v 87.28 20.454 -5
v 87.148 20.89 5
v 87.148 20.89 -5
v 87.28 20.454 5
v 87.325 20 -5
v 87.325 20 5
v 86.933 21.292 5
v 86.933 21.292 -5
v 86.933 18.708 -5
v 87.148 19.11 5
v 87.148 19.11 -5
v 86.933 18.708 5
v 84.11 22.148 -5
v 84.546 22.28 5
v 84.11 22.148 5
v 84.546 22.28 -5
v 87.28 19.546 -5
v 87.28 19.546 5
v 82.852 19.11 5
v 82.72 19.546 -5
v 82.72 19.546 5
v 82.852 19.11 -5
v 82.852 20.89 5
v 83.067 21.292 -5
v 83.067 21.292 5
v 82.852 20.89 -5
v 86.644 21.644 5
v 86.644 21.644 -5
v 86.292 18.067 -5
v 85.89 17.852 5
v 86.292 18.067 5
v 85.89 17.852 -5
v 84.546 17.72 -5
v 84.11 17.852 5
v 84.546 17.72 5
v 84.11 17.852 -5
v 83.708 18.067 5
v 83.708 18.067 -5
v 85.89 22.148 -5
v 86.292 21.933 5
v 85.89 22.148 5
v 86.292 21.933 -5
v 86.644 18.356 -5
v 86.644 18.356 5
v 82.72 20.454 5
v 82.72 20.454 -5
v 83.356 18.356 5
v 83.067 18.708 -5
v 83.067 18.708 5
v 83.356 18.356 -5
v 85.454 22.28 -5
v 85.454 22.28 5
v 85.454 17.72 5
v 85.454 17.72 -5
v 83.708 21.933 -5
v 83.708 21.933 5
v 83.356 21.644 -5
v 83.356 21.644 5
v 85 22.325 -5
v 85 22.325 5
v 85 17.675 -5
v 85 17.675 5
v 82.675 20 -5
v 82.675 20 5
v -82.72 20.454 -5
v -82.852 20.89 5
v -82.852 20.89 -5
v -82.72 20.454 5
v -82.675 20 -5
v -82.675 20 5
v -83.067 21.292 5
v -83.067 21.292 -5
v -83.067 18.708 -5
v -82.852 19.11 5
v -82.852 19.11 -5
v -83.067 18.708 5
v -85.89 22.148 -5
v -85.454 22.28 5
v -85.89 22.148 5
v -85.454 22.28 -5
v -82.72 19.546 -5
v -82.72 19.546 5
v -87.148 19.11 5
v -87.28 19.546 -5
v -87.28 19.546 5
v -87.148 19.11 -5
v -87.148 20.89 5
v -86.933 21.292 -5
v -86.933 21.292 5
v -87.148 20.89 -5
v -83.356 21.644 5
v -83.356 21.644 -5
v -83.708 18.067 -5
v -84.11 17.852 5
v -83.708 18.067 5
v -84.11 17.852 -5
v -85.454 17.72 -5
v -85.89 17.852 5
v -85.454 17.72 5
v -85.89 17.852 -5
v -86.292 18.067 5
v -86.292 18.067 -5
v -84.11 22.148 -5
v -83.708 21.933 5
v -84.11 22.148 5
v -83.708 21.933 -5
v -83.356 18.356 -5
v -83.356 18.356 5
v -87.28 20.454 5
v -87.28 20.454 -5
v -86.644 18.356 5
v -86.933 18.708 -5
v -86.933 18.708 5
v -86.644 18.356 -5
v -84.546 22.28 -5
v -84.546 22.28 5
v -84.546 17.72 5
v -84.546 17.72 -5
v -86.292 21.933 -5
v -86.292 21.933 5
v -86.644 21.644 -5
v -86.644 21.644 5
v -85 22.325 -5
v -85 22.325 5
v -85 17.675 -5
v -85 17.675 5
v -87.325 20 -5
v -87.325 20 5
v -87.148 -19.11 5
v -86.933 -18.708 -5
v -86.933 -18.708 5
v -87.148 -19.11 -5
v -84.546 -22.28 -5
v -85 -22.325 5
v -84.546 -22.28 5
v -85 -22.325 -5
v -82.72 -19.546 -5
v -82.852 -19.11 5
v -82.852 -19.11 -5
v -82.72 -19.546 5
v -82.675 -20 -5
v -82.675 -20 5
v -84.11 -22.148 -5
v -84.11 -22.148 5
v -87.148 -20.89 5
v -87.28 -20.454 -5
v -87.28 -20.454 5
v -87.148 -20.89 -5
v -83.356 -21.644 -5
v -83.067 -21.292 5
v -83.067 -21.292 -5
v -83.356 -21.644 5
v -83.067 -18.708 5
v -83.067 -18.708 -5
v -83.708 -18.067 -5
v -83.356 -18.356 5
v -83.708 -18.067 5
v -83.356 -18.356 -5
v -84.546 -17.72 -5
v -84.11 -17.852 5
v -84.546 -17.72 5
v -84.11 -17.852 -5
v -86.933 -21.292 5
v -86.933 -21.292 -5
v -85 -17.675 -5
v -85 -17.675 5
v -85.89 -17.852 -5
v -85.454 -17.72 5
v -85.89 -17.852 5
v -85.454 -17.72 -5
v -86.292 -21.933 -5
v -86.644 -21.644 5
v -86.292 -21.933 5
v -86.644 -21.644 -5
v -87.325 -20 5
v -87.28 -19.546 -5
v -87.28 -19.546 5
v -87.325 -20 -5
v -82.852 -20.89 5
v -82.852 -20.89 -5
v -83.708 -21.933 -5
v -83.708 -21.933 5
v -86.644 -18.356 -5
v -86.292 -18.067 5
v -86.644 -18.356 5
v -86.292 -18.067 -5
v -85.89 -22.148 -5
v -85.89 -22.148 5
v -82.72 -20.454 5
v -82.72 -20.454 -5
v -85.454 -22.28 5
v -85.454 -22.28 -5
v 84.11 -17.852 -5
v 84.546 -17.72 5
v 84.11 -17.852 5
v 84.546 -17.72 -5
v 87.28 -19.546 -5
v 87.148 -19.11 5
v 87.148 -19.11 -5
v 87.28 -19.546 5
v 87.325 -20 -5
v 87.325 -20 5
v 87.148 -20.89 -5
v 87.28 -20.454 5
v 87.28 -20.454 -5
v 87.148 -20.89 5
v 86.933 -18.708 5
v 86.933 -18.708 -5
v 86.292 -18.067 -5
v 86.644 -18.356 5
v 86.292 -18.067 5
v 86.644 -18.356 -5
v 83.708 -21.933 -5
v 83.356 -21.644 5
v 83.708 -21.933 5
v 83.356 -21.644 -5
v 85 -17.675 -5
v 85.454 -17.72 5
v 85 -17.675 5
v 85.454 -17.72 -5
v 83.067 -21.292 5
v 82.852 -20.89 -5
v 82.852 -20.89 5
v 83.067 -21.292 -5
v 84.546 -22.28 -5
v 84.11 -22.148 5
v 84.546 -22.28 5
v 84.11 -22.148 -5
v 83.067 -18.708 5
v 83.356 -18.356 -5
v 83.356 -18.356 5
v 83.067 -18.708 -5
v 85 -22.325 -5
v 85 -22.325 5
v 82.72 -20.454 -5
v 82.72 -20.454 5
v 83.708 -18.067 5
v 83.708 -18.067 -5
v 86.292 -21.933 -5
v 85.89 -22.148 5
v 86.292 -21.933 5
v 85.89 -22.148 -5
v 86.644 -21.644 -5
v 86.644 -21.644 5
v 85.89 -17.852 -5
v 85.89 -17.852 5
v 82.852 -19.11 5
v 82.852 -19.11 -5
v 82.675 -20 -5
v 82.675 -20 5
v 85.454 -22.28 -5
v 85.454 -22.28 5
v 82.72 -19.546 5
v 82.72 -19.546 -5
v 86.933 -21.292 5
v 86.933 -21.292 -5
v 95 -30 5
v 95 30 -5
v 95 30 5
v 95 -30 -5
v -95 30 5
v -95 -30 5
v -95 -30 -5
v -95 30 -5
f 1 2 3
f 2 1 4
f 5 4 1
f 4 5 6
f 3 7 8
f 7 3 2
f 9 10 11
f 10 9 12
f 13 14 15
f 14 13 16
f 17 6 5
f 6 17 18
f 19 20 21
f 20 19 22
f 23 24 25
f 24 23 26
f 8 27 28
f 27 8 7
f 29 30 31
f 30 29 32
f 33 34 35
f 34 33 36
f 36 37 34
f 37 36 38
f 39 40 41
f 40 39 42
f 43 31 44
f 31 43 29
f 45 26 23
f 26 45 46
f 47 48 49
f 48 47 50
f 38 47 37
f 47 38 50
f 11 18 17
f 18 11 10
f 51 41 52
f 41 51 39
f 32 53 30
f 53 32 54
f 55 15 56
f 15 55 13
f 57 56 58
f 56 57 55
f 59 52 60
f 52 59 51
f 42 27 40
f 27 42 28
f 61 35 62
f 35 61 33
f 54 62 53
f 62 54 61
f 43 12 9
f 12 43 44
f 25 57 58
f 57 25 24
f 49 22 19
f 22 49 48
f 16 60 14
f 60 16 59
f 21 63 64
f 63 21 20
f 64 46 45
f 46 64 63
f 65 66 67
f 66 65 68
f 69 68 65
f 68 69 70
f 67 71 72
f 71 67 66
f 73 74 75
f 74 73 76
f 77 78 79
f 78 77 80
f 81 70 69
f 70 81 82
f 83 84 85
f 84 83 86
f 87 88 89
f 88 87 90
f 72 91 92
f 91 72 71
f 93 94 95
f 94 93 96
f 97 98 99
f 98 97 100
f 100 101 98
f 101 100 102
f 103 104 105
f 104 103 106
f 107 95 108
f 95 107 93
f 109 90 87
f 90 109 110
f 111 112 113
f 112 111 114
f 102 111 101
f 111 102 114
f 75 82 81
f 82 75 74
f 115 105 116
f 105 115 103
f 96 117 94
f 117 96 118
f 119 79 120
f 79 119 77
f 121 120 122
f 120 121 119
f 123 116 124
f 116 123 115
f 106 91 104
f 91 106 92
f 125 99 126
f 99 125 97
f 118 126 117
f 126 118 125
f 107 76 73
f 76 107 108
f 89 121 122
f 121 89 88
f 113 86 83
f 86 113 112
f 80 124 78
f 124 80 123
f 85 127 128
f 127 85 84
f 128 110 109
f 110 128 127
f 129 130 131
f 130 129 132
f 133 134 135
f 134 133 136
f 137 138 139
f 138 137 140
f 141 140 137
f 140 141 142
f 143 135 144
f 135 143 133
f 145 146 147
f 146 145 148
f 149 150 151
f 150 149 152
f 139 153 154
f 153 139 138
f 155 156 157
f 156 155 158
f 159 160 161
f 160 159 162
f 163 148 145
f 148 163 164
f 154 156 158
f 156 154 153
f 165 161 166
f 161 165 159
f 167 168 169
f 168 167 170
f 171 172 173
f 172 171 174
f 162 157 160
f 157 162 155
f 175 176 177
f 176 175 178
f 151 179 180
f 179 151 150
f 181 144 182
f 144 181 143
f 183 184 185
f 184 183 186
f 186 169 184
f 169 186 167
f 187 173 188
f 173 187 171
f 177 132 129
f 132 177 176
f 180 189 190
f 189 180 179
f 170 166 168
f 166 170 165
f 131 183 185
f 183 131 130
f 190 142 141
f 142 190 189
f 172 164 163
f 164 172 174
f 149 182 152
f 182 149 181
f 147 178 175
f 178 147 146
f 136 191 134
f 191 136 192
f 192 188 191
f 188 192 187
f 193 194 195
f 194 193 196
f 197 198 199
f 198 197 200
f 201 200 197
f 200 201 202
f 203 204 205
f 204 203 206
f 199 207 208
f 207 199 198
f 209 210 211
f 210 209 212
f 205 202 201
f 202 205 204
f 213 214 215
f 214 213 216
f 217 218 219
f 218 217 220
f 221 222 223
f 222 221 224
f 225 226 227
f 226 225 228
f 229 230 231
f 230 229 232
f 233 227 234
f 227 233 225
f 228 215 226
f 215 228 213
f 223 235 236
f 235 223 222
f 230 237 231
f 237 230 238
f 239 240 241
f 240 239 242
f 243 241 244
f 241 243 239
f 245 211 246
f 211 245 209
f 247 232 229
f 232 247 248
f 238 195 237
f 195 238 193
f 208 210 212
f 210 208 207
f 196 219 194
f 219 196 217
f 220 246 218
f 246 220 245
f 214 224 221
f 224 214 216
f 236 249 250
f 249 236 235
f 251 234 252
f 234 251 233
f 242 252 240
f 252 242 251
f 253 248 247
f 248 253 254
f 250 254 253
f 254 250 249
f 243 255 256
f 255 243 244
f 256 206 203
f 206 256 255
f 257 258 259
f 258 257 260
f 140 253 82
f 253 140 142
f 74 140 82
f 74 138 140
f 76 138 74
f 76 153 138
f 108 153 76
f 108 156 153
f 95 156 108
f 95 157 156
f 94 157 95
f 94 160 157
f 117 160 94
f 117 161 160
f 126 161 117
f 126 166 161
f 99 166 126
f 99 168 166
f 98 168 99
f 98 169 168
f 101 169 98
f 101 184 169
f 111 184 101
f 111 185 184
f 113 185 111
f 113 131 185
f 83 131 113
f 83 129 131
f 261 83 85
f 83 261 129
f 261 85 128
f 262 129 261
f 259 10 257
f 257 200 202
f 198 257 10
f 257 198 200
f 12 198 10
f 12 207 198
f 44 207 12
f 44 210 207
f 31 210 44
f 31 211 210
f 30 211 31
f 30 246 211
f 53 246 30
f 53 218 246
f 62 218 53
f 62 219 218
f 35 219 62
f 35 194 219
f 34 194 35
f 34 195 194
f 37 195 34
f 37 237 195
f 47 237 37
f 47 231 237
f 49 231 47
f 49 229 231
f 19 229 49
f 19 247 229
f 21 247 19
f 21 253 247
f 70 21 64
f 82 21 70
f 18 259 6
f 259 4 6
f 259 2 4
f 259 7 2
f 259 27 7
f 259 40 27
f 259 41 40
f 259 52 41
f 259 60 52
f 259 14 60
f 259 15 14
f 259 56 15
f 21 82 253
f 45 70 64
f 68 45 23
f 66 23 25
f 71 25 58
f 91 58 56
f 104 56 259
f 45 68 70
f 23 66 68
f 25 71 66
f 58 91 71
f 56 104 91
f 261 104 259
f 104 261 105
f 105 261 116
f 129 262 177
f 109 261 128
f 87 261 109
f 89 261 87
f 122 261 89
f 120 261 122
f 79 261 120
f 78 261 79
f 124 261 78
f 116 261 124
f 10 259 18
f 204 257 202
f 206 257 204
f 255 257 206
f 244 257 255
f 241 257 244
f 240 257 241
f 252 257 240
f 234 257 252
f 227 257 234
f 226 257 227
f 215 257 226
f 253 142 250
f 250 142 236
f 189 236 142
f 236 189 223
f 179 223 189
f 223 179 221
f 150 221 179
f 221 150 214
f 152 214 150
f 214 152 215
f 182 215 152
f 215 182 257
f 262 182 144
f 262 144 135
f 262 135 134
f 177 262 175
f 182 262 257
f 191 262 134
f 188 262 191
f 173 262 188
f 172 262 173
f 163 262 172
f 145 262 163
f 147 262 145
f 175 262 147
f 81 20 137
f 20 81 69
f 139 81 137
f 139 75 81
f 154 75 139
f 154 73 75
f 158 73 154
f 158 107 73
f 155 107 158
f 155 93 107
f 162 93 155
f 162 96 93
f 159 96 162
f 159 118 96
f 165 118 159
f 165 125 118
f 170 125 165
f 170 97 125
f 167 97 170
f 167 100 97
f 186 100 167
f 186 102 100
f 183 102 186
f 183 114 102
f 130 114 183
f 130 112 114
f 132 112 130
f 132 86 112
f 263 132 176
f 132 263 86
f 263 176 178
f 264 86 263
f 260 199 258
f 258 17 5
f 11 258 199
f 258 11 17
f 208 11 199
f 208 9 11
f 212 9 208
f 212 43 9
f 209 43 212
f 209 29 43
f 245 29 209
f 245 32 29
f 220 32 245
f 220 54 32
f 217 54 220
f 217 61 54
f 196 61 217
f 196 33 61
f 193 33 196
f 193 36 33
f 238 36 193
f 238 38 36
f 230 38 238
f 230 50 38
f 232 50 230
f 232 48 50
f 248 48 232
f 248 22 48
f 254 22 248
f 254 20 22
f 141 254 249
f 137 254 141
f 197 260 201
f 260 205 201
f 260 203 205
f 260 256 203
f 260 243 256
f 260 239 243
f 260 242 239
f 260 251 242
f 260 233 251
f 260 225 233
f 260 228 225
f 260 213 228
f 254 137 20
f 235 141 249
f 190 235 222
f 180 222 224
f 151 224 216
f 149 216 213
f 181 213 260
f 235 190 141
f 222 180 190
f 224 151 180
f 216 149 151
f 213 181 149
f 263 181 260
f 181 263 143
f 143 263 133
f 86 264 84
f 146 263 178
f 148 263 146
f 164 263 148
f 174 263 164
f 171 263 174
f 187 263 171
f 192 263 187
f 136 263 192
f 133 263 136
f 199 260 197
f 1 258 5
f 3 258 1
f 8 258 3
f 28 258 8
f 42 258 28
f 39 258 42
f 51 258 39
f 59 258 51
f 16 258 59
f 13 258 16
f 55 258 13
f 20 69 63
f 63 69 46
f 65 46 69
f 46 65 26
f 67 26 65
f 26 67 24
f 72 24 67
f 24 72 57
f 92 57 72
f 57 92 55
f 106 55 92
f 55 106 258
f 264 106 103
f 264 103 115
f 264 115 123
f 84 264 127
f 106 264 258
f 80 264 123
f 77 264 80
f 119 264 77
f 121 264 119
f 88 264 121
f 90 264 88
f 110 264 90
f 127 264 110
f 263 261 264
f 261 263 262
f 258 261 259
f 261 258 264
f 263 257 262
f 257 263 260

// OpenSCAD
$fn = 32;

// ----------------------------------------------------------------------
// Corner plate 190 x 60 x 10
// 4 holes, centres taken from the edge offset
// ----------------------------------------------------------------------

// --- parameters (mm) ---
plate = [190, 60, 10];   // overall size (x, y, z)
holes = 4;               // number of holes the drawing asks for
bore_d = 4.5;            // nominal hole diameter from the drawing
print_allowance = 0.15;  // clearance added for printing
edge = 10;               // hole centre offset from the plate edge

// --- derived feature positions (mm) ---
hole_d = bore_d + print_allowance;  // = 4.65   hole diameter as printed
corner_x = plate[0] / 2 - edge;     // = 85   corner hole X
corner_y = plate[1] / 2 - edge;     // = 20   corner hole Y
feature_centers = [
  [corner_x, corner_y],
  [-corner_x, corner_y],
  [-corner_x, -corner_y],
  [corner_x, -corner_y]
];   // hole centres the loop below drills

// plate outline, every hole drilled through with the same cutters
difference() {
  cube(plate, center = true);
  for (centre = feature_centers)
    translate([centre[0], centre[1], 0])
      cylinder(d = hole_d, h = plate[2] + 2, center = true);
}
